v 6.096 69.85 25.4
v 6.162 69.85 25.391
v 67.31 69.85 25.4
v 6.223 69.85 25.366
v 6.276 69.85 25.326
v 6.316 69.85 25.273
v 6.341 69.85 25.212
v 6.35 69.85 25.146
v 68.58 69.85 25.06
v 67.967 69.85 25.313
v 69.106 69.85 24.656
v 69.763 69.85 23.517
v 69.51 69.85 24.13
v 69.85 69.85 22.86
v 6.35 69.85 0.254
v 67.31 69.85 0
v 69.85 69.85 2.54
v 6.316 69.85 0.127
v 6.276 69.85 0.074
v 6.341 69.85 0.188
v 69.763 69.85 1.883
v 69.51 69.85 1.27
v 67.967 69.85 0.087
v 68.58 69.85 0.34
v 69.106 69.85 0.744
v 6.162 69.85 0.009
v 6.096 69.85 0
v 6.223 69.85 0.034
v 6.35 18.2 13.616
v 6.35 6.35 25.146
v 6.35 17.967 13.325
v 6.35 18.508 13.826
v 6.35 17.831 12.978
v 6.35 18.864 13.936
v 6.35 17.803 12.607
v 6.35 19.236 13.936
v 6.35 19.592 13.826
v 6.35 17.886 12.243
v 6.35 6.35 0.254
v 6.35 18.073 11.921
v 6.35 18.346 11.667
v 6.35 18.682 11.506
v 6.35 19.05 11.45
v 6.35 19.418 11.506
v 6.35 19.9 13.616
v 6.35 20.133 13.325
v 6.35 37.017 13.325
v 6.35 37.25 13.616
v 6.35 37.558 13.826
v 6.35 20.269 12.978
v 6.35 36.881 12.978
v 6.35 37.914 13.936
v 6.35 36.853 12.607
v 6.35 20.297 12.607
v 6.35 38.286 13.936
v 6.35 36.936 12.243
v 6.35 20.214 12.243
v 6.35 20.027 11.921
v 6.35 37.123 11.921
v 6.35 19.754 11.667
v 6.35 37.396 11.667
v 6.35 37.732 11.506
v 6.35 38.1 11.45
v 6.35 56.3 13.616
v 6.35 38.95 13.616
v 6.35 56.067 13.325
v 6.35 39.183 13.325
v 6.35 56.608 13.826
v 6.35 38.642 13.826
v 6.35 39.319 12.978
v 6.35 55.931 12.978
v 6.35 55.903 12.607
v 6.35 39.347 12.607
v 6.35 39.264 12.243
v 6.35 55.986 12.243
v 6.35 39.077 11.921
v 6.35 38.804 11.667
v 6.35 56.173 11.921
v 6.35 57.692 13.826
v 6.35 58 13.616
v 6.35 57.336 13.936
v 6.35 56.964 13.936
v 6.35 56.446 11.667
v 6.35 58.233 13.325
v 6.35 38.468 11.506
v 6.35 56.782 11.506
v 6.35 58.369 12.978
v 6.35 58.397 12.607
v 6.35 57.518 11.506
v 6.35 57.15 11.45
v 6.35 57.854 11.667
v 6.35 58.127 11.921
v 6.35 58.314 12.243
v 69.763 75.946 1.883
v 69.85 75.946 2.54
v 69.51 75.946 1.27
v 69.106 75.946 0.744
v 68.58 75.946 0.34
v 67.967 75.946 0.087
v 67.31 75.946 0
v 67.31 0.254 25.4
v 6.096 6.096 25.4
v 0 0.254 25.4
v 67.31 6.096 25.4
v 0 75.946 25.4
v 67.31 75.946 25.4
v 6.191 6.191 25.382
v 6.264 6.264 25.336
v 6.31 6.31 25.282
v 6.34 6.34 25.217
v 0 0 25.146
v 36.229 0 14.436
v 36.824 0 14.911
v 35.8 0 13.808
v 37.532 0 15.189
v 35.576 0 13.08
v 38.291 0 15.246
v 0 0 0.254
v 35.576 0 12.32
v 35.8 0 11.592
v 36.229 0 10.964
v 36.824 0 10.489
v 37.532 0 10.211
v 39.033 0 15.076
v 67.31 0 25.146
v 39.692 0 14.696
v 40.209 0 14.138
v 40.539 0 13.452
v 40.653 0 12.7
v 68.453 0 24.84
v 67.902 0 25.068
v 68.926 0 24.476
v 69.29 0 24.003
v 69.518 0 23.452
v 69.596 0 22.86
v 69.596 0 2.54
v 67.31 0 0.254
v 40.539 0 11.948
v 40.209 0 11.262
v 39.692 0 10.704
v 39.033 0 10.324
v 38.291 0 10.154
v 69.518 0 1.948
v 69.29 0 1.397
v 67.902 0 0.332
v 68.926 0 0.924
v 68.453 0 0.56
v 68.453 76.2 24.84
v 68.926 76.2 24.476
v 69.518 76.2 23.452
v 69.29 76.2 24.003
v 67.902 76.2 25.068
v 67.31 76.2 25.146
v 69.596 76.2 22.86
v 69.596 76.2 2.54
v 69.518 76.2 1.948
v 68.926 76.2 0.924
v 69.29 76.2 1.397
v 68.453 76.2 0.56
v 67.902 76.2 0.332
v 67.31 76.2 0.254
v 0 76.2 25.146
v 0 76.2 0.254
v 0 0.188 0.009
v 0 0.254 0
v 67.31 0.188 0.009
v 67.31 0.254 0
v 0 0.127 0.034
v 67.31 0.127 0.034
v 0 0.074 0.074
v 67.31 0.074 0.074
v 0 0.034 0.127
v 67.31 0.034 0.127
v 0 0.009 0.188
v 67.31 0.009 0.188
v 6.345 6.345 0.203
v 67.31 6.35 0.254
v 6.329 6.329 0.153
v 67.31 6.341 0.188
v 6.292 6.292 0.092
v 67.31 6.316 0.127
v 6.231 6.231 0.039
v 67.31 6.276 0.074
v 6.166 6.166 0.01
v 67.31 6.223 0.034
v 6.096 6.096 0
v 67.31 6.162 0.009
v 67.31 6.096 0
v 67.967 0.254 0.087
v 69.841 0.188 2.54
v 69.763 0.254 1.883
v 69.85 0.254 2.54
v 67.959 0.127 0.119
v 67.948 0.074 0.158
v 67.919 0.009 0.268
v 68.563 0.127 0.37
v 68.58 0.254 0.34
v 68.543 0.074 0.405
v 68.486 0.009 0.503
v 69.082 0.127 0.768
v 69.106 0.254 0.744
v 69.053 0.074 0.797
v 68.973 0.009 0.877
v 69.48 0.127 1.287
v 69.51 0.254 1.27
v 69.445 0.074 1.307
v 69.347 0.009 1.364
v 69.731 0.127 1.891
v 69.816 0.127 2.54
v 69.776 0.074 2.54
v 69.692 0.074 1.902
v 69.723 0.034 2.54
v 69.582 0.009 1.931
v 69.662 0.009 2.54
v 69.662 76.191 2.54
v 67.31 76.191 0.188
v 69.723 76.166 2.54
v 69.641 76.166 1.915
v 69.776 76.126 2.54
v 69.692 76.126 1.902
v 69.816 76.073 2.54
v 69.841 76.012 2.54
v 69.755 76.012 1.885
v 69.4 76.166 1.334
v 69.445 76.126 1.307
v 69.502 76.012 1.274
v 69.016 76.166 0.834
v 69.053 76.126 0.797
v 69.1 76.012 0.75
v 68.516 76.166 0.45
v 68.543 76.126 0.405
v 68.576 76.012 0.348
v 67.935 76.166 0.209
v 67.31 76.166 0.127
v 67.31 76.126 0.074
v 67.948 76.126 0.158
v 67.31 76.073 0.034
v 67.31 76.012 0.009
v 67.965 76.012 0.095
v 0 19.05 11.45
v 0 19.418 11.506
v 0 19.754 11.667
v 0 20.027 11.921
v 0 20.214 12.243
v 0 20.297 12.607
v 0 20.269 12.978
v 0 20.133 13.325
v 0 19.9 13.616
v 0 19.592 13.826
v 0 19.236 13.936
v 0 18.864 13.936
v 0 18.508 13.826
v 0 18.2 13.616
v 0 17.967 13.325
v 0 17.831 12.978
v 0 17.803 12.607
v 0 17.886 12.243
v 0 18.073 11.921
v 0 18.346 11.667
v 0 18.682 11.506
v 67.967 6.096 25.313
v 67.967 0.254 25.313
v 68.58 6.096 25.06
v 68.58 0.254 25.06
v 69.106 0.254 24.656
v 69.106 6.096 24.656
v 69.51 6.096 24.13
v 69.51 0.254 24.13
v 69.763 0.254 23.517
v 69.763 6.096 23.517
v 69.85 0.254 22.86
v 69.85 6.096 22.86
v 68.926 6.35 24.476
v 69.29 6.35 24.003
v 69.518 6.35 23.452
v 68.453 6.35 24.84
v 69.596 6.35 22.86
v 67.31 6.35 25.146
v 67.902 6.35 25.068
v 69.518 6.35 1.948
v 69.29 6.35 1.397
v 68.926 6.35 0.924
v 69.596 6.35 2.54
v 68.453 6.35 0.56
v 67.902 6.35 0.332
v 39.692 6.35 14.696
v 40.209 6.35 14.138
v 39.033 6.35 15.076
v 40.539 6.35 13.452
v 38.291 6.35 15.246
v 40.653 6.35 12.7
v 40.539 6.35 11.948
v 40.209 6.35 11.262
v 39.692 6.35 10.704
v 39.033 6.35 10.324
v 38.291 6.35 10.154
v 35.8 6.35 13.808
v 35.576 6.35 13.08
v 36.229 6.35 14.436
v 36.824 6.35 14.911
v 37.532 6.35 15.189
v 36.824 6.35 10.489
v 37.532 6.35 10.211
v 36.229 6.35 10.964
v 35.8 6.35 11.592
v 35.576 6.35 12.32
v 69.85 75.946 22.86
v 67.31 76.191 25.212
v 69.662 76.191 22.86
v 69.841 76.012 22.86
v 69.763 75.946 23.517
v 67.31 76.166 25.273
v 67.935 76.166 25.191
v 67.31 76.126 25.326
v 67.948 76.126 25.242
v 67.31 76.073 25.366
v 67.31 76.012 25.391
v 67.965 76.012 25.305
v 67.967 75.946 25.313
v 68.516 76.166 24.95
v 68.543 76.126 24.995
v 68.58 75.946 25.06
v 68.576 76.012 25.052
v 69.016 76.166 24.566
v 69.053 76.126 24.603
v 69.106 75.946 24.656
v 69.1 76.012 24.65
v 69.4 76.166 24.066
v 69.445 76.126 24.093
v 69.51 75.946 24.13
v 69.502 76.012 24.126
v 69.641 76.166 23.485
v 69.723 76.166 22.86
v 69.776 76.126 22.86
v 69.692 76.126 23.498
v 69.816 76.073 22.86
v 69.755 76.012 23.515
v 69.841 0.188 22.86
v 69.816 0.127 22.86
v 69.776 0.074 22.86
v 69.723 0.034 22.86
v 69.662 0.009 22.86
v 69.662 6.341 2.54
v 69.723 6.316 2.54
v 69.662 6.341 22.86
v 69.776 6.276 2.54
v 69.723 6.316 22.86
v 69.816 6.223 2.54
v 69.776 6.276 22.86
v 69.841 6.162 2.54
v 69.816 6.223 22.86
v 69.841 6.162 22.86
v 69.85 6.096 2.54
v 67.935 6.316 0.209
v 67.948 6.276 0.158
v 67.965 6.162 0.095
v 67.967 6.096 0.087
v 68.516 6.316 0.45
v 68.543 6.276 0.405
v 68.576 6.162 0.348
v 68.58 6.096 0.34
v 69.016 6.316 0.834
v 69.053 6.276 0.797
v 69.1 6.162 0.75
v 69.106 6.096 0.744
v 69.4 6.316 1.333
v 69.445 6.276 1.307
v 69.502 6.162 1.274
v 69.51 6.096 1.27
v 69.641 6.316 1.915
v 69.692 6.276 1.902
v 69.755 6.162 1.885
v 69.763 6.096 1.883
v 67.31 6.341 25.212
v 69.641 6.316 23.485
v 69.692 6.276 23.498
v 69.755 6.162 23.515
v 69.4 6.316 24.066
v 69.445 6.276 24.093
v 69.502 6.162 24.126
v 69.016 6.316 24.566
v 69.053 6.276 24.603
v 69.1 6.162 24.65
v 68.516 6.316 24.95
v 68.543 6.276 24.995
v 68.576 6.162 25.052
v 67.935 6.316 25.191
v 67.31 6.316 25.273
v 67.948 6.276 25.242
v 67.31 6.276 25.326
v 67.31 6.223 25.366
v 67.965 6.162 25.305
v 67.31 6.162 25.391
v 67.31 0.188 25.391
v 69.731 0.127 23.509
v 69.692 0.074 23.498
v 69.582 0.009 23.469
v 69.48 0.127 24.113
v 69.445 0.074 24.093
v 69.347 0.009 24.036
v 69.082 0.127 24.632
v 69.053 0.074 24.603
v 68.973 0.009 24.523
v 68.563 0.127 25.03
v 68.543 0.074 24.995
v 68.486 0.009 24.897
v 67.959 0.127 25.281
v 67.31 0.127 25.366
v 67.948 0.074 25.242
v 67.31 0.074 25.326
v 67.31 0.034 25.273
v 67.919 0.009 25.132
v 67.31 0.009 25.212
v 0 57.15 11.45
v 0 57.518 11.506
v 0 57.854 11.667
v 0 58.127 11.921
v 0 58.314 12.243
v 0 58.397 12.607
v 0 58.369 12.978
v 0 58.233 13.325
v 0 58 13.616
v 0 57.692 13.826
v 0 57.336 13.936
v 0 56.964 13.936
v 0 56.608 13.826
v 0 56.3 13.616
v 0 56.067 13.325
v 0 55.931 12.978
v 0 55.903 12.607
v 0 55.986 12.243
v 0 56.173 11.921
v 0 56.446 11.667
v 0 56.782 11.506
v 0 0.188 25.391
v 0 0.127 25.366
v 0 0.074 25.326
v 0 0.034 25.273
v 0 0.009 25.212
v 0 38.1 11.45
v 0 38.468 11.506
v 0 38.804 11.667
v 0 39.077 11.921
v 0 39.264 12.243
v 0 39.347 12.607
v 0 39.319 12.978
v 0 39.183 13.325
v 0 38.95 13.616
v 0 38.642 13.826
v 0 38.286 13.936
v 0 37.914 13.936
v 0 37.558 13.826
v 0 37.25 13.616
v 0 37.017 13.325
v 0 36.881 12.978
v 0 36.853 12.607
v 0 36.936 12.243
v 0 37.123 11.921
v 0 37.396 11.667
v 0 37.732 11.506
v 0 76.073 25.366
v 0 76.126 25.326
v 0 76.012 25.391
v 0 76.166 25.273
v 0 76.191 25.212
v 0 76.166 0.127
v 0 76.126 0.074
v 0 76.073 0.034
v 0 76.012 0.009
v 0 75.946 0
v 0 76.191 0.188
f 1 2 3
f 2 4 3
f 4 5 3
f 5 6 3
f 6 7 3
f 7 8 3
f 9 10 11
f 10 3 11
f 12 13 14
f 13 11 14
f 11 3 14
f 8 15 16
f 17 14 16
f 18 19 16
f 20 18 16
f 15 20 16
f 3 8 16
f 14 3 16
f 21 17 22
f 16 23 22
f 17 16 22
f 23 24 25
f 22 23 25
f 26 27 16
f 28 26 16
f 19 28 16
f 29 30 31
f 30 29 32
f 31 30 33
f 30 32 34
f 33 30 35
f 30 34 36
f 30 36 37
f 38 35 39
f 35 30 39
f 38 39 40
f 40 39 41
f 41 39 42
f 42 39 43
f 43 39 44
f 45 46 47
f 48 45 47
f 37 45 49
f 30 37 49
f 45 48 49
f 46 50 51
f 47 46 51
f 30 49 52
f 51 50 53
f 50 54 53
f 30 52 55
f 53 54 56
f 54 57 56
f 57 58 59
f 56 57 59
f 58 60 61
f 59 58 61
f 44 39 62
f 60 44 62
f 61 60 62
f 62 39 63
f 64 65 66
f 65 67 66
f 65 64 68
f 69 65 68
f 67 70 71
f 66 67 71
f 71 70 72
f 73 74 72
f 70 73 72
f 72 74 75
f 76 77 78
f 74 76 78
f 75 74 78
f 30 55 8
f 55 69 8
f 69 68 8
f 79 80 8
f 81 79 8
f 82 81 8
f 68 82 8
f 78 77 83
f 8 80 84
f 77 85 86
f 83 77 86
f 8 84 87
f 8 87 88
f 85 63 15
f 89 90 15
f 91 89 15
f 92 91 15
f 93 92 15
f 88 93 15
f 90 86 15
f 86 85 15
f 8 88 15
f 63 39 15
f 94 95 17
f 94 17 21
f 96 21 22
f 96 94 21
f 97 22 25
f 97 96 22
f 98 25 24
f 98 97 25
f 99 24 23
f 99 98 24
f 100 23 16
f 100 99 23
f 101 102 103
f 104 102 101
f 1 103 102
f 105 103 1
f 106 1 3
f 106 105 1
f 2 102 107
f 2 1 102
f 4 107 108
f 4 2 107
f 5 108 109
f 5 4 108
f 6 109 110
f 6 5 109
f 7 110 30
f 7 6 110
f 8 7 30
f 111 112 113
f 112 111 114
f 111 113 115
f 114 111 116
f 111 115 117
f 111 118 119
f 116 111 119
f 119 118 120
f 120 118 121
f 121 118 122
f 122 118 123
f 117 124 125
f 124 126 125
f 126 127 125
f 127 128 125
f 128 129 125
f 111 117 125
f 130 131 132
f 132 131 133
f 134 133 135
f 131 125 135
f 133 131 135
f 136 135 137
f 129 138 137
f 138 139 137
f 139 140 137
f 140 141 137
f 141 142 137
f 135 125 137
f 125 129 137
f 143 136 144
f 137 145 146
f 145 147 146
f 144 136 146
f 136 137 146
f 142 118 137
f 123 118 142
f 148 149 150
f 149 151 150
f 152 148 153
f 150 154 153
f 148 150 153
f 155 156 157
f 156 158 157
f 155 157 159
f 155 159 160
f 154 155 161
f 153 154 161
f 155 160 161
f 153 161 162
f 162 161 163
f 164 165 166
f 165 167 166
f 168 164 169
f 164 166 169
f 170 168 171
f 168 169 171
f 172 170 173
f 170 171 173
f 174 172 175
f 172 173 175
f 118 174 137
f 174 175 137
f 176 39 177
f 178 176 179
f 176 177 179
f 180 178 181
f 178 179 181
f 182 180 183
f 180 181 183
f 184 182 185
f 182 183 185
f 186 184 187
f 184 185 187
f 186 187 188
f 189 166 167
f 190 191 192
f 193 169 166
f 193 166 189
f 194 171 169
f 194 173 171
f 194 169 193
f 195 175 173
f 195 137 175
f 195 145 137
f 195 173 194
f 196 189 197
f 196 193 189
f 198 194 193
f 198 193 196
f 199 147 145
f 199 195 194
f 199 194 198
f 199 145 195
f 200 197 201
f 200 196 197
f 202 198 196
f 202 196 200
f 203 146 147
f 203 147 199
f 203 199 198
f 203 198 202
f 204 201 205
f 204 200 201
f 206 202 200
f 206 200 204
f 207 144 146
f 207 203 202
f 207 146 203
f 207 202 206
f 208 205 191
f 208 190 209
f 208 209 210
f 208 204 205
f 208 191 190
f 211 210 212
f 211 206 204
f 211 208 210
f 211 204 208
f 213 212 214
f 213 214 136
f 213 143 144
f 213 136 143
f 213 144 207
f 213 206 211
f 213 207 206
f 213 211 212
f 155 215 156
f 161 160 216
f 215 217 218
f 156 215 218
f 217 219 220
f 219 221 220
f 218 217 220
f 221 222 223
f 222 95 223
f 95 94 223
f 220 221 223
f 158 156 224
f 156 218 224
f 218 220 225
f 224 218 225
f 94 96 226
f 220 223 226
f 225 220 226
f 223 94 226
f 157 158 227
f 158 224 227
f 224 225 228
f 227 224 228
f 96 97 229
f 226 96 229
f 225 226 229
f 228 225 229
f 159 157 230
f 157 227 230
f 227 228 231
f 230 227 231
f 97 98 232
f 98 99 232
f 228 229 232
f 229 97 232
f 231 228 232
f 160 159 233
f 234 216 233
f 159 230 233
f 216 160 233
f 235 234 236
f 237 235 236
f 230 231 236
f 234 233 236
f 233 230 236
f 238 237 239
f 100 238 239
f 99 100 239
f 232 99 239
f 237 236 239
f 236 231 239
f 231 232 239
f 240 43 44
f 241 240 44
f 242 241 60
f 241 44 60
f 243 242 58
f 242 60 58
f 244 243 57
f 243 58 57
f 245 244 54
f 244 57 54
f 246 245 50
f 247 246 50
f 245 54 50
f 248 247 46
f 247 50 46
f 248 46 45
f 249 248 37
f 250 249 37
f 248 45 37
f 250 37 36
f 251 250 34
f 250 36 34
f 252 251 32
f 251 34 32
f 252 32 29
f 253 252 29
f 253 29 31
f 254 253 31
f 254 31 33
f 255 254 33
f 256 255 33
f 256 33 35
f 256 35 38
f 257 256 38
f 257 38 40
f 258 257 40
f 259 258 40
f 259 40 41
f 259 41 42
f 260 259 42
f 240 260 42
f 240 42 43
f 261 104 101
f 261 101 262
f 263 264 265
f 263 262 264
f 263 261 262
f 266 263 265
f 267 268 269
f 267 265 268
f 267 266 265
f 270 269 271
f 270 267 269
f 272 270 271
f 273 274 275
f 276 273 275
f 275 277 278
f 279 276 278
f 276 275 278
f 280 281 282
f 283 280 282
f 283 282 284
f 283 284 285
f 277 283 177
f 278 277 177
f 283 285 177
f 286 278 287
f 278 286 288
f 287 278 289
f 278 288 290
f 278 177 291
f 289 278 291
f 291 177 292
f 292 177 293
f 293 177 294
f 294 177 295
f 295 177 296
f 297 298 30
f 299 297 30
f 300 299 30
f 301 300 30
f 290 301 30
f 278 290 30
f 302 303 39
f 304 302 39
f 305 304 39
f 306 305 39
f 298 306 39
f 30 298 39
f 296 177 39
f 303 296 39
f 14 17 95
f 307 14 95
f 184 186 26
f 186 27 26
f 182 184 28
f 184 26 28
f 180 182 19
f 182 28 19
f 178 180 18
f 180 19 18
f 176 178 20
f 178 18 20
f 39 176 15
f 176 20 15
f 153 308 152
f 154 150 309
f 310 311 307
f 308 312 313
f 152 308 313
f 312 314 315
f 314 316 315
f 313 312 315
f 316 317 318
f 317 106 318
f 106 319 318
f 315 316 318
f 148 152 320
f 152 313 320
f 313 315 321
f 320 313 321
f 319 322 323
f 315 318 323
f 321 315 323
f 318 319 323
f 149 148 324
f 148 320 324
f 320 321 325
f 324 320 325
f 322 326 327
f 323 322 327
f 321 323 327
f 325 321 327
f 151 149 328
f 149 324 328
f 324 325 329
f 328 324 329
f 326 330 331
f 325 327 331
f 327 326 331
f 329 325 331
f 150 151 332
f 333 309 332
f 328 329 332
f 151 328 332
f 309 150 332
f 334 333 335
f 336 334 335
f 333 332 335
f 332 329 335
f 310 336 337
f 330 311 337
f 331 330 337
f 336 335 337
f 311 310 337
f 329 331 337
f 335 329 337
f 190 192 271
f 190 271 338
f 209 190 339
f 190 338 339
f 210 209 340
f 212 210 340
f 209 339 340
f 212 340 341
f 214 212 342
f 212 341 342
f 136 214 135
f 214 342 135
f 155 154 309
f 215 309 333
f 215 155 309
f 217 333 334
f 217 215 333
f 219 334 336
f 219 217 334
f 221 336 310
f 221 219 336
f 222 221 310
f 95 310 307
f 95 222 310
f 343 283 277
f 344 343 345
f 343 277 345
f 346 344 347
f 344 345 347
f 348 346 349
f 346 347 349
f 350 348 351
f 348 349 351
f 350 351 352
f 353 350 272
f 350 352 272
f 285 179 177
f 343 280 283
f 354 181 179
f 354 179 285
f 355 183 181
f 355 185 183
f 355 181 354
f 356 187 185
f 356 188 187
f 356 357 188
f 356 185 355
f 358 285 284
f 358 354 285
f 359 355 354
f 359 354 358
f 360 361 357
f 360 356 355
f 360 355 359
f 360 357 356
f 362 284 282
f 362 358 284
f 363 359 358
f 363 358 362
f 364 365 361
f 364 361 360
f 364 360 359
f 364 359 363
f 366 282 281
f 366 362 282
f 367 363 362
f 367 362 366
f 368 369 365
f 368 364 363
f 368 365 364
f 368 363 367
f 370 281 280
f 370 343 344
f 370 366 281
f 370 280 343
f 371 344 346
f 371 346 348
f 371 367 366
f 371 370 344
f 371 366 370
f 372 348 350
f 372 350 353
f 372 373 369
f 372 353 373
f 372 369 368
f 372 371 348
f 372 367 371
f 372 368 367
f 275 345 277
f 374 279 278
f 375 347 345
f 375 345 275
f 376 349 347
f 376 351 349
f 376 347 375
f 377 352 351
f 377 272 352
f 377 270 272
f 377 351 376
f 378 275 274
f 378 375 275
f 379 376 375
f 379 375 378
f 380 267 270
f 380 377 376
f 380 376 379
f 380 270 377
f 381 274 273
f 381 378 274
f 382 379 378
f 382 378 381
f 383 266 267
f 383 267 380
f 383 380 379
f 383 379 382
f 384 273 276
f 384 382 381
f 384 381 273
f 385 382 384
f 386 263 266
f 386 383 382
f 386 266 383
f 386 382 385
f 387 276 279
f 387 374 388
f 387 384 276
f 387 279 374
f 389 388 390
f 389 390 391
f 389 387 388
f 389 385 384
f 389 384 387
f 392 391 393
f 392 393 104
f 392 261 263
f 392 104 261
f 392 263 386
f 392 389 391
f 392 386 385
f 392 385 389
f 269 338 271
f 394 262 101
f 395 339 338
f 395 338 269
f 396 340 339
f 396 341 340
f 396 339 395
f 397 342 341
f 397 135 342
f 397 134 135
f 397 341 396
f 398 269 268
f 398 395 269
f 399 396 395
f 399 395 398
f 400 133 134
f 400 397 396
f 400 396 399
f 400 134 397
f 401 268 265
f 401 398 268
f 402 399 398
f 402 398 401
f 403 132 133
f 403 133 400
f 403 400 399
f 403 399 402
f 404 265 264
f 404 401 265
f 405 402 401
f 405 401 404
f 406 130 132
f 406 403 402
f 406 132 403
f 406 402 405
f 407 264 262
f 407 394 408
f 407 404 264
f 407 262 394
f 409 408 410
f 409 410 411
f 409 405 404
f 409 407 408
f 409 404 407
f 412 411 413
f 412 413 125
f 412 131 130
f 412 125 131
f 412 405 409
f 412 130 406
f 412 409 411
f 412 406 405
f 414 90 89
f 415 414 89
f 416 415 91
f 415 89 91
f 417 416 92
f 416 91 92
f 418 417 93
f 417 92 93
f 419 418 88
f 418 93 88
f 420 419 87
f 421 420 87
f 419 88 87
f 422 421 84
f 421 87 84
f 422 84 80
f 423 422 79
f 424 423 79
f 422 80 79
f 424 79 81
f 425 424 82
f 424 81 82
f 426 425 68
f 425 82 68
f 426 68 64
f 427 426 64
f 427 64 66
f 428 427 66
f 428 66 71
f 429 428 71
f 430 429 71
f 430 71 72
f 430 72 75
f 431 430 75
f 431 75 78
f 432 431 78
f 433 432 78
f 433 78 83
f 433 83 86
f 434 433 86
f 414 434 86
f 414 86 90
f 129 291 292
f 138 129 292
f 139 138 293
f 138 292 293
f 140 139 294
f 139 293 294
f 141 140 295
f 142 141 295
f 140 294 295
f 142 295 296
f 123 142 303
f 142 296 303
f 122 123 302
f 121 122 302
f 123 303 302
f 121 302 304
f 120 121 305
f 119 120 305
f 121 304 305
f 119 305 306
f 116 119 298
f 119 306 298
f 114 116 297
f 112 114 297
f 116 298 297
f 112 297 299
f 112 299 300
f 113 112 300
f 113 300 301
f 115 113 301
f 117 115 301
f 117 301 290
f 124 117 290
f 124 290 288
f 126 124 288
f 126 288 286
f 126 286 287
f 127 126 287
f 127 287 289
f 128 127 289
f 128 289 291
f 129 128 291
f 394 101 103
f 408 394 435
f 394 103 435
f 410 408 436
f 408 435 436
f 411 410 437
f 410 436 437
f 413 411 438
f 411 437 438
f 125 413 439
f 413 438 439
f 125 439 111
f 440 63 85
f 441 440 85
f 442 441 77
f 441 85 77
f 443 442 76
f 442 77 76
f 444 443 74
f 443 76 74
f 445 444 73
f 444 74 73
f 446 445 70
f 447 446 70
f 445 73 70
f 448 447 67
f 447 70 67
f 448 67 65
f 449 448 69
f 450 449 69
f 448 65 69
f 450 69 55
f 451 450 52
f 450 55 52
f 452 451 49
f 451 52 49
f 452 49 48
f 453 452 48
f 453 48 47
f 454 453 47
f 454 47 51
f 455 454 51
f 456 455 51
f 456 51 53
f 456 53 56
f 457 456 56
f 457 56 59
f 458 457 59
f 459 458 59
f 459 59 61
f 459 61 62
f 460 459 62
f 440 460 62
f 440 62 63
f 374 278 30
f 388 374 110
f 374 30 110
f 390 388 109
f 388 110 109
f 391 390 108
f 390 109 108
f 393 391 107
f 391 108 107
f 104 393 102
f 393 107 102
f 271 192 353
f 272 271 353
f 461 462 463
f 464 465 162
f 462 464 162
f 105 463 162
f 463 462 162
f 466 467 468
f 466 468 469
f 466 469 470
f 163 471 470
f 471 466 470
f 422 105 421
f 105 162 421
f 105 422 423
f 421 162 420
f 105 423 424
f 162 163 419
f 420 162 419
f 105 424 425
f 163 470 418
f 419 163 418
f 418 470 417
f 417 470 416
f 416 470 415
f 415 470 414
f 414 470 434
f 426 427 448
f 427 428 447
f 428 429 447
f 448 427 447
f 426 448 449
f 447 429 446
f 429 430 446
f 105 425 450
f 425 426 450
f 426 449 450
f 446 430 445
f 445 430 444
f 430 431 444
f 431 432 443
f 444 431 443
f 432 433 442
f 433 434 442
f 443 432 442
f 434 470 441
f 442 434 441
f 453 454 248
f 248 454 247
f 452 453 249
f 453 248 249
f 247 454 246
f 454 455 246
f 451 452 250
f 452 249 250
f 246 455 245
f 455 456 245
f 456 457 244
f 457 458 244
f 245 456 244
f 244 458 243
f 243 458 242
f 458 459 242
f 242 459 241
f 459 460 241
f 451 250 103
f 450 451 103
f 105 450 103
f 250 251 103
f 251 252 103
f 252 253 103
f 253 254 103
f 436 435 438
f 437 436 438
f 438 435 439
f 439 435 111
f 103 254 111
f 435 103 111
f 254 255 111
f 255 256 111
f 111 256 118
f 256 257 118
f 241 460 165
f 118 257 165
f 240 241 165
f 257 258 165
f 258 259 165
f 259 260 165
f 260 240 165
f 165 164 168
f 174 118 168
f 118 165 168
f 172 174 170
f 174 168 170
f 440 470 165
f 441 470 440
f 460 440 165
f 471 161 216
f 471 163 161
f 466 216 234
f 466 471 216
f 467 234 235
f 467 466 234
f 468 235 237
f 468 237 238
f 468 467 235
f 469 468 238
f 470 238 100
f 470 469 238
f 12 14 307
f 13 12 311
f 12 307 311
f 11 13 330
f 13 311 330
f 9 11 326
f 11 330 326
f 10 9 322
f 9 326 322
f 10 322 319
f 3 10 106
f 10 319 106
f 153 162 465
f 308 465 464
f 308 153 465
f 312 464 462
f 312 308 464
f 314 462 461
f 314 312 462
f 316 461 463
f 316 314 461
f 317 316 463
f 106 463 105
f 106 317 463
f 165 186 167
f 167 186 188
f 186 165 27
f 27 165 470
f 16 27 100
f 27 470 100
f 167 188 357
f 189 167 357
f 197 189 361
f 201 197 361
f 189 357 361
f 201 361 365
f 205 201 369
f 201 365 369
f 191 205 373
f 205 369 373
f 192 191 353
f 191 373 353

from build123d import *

# Parameters (mm, degrees)
BOSS_EXTRUDE1_DEPTH         = 25.4
M3X0_5_TAPPED_HOLE1_D       = 2.5
F_1_4_20_TAPPED_HOLE1_D     = 5.1054
F_1_4_20_TAPPED_HOLE1_DEPTH = 6.35
FILLET1_R                   = 2.54
FILLET2_R                   = 0.254


with BuildPart() as part:
    # Sketch1 → Boss-Extrude1 (new body)
    with BuildSketch(Plane.XY):
        Polygon((69.85, 69.85), (69.85, 76.2), (0, 76.2), (0, 0), (69.85, 0), (69.85, 6.35), (6.35, 6.35), (6.35, 69.85), align=None)
    extrude(amount=BOSS_EXTRUDE1_DEPTH)

    # M3x0.5 Tapped Hole1 (through all)
    with Locations(Plane.ZY):
        with Locations((12.7, 57.15), (12.7, 38.1), (12.7, 19.05)):
            Hole(M3X0_5_TAPPED_HOLE1_D / 2)

    # 1/4-20 Tapped Hole1
    with Locations(Plane(origin=(0, 0, 0), x_dir=(-1, 0, 0), z_dir=(0, -1, 0))):
        with Locations((-38.1, -12.7)):
            Hole(F_1_4_20_TAPPED_HOLE1_D / 2, depth=F_1_4_20_TAPPED_HOLE1_DEPTH)

    # Fillet1
    fillet1_edges = [part.edges().sort_by_distance(p)[0] for p in [
        (69.85, 3.175, 0),
        (69.85, 3.175, 25.4),
        (69.85, 73.025, 25.4),
        (69.85, 73.025, 0),
    ]]
    fillet(fillet1_edges, radius=FILLET1_R)

    # Fillet2
    fillet2_edges = [part.edges().sort_by_distance(p)[0] for p in [
        (33.655, 0, 0),
        (6.35, 38.1, 25.4),
        (69.85, 6.35, 12.7),
        (69.85, 0, 12.7),
        (36.83, 6.35, 0),
        (36.83, 6.35, 25.4),
        (69.106051224, 6.35, 24.656051224),
        (69.106051224, 6.35, 0.743948776),
        (33.655, 76.2, 0),
        (69.106051224, 0, 24.656051224),
        (69.106051224, 0, 0.743948776),
        (33.655, 76.2, 25.4),
        (69.85, 76.2, 12.7),
        (69.106051224, 76.2, 24.656051224),
        (69.106051224, 76.2, 0.743948776),
        (33.655, 0, 25.4),
        (6.35, 38.1, 0),
    ]]
    fillet(fillet2_edges, radius=FILLET2_R)


solid = part.part
